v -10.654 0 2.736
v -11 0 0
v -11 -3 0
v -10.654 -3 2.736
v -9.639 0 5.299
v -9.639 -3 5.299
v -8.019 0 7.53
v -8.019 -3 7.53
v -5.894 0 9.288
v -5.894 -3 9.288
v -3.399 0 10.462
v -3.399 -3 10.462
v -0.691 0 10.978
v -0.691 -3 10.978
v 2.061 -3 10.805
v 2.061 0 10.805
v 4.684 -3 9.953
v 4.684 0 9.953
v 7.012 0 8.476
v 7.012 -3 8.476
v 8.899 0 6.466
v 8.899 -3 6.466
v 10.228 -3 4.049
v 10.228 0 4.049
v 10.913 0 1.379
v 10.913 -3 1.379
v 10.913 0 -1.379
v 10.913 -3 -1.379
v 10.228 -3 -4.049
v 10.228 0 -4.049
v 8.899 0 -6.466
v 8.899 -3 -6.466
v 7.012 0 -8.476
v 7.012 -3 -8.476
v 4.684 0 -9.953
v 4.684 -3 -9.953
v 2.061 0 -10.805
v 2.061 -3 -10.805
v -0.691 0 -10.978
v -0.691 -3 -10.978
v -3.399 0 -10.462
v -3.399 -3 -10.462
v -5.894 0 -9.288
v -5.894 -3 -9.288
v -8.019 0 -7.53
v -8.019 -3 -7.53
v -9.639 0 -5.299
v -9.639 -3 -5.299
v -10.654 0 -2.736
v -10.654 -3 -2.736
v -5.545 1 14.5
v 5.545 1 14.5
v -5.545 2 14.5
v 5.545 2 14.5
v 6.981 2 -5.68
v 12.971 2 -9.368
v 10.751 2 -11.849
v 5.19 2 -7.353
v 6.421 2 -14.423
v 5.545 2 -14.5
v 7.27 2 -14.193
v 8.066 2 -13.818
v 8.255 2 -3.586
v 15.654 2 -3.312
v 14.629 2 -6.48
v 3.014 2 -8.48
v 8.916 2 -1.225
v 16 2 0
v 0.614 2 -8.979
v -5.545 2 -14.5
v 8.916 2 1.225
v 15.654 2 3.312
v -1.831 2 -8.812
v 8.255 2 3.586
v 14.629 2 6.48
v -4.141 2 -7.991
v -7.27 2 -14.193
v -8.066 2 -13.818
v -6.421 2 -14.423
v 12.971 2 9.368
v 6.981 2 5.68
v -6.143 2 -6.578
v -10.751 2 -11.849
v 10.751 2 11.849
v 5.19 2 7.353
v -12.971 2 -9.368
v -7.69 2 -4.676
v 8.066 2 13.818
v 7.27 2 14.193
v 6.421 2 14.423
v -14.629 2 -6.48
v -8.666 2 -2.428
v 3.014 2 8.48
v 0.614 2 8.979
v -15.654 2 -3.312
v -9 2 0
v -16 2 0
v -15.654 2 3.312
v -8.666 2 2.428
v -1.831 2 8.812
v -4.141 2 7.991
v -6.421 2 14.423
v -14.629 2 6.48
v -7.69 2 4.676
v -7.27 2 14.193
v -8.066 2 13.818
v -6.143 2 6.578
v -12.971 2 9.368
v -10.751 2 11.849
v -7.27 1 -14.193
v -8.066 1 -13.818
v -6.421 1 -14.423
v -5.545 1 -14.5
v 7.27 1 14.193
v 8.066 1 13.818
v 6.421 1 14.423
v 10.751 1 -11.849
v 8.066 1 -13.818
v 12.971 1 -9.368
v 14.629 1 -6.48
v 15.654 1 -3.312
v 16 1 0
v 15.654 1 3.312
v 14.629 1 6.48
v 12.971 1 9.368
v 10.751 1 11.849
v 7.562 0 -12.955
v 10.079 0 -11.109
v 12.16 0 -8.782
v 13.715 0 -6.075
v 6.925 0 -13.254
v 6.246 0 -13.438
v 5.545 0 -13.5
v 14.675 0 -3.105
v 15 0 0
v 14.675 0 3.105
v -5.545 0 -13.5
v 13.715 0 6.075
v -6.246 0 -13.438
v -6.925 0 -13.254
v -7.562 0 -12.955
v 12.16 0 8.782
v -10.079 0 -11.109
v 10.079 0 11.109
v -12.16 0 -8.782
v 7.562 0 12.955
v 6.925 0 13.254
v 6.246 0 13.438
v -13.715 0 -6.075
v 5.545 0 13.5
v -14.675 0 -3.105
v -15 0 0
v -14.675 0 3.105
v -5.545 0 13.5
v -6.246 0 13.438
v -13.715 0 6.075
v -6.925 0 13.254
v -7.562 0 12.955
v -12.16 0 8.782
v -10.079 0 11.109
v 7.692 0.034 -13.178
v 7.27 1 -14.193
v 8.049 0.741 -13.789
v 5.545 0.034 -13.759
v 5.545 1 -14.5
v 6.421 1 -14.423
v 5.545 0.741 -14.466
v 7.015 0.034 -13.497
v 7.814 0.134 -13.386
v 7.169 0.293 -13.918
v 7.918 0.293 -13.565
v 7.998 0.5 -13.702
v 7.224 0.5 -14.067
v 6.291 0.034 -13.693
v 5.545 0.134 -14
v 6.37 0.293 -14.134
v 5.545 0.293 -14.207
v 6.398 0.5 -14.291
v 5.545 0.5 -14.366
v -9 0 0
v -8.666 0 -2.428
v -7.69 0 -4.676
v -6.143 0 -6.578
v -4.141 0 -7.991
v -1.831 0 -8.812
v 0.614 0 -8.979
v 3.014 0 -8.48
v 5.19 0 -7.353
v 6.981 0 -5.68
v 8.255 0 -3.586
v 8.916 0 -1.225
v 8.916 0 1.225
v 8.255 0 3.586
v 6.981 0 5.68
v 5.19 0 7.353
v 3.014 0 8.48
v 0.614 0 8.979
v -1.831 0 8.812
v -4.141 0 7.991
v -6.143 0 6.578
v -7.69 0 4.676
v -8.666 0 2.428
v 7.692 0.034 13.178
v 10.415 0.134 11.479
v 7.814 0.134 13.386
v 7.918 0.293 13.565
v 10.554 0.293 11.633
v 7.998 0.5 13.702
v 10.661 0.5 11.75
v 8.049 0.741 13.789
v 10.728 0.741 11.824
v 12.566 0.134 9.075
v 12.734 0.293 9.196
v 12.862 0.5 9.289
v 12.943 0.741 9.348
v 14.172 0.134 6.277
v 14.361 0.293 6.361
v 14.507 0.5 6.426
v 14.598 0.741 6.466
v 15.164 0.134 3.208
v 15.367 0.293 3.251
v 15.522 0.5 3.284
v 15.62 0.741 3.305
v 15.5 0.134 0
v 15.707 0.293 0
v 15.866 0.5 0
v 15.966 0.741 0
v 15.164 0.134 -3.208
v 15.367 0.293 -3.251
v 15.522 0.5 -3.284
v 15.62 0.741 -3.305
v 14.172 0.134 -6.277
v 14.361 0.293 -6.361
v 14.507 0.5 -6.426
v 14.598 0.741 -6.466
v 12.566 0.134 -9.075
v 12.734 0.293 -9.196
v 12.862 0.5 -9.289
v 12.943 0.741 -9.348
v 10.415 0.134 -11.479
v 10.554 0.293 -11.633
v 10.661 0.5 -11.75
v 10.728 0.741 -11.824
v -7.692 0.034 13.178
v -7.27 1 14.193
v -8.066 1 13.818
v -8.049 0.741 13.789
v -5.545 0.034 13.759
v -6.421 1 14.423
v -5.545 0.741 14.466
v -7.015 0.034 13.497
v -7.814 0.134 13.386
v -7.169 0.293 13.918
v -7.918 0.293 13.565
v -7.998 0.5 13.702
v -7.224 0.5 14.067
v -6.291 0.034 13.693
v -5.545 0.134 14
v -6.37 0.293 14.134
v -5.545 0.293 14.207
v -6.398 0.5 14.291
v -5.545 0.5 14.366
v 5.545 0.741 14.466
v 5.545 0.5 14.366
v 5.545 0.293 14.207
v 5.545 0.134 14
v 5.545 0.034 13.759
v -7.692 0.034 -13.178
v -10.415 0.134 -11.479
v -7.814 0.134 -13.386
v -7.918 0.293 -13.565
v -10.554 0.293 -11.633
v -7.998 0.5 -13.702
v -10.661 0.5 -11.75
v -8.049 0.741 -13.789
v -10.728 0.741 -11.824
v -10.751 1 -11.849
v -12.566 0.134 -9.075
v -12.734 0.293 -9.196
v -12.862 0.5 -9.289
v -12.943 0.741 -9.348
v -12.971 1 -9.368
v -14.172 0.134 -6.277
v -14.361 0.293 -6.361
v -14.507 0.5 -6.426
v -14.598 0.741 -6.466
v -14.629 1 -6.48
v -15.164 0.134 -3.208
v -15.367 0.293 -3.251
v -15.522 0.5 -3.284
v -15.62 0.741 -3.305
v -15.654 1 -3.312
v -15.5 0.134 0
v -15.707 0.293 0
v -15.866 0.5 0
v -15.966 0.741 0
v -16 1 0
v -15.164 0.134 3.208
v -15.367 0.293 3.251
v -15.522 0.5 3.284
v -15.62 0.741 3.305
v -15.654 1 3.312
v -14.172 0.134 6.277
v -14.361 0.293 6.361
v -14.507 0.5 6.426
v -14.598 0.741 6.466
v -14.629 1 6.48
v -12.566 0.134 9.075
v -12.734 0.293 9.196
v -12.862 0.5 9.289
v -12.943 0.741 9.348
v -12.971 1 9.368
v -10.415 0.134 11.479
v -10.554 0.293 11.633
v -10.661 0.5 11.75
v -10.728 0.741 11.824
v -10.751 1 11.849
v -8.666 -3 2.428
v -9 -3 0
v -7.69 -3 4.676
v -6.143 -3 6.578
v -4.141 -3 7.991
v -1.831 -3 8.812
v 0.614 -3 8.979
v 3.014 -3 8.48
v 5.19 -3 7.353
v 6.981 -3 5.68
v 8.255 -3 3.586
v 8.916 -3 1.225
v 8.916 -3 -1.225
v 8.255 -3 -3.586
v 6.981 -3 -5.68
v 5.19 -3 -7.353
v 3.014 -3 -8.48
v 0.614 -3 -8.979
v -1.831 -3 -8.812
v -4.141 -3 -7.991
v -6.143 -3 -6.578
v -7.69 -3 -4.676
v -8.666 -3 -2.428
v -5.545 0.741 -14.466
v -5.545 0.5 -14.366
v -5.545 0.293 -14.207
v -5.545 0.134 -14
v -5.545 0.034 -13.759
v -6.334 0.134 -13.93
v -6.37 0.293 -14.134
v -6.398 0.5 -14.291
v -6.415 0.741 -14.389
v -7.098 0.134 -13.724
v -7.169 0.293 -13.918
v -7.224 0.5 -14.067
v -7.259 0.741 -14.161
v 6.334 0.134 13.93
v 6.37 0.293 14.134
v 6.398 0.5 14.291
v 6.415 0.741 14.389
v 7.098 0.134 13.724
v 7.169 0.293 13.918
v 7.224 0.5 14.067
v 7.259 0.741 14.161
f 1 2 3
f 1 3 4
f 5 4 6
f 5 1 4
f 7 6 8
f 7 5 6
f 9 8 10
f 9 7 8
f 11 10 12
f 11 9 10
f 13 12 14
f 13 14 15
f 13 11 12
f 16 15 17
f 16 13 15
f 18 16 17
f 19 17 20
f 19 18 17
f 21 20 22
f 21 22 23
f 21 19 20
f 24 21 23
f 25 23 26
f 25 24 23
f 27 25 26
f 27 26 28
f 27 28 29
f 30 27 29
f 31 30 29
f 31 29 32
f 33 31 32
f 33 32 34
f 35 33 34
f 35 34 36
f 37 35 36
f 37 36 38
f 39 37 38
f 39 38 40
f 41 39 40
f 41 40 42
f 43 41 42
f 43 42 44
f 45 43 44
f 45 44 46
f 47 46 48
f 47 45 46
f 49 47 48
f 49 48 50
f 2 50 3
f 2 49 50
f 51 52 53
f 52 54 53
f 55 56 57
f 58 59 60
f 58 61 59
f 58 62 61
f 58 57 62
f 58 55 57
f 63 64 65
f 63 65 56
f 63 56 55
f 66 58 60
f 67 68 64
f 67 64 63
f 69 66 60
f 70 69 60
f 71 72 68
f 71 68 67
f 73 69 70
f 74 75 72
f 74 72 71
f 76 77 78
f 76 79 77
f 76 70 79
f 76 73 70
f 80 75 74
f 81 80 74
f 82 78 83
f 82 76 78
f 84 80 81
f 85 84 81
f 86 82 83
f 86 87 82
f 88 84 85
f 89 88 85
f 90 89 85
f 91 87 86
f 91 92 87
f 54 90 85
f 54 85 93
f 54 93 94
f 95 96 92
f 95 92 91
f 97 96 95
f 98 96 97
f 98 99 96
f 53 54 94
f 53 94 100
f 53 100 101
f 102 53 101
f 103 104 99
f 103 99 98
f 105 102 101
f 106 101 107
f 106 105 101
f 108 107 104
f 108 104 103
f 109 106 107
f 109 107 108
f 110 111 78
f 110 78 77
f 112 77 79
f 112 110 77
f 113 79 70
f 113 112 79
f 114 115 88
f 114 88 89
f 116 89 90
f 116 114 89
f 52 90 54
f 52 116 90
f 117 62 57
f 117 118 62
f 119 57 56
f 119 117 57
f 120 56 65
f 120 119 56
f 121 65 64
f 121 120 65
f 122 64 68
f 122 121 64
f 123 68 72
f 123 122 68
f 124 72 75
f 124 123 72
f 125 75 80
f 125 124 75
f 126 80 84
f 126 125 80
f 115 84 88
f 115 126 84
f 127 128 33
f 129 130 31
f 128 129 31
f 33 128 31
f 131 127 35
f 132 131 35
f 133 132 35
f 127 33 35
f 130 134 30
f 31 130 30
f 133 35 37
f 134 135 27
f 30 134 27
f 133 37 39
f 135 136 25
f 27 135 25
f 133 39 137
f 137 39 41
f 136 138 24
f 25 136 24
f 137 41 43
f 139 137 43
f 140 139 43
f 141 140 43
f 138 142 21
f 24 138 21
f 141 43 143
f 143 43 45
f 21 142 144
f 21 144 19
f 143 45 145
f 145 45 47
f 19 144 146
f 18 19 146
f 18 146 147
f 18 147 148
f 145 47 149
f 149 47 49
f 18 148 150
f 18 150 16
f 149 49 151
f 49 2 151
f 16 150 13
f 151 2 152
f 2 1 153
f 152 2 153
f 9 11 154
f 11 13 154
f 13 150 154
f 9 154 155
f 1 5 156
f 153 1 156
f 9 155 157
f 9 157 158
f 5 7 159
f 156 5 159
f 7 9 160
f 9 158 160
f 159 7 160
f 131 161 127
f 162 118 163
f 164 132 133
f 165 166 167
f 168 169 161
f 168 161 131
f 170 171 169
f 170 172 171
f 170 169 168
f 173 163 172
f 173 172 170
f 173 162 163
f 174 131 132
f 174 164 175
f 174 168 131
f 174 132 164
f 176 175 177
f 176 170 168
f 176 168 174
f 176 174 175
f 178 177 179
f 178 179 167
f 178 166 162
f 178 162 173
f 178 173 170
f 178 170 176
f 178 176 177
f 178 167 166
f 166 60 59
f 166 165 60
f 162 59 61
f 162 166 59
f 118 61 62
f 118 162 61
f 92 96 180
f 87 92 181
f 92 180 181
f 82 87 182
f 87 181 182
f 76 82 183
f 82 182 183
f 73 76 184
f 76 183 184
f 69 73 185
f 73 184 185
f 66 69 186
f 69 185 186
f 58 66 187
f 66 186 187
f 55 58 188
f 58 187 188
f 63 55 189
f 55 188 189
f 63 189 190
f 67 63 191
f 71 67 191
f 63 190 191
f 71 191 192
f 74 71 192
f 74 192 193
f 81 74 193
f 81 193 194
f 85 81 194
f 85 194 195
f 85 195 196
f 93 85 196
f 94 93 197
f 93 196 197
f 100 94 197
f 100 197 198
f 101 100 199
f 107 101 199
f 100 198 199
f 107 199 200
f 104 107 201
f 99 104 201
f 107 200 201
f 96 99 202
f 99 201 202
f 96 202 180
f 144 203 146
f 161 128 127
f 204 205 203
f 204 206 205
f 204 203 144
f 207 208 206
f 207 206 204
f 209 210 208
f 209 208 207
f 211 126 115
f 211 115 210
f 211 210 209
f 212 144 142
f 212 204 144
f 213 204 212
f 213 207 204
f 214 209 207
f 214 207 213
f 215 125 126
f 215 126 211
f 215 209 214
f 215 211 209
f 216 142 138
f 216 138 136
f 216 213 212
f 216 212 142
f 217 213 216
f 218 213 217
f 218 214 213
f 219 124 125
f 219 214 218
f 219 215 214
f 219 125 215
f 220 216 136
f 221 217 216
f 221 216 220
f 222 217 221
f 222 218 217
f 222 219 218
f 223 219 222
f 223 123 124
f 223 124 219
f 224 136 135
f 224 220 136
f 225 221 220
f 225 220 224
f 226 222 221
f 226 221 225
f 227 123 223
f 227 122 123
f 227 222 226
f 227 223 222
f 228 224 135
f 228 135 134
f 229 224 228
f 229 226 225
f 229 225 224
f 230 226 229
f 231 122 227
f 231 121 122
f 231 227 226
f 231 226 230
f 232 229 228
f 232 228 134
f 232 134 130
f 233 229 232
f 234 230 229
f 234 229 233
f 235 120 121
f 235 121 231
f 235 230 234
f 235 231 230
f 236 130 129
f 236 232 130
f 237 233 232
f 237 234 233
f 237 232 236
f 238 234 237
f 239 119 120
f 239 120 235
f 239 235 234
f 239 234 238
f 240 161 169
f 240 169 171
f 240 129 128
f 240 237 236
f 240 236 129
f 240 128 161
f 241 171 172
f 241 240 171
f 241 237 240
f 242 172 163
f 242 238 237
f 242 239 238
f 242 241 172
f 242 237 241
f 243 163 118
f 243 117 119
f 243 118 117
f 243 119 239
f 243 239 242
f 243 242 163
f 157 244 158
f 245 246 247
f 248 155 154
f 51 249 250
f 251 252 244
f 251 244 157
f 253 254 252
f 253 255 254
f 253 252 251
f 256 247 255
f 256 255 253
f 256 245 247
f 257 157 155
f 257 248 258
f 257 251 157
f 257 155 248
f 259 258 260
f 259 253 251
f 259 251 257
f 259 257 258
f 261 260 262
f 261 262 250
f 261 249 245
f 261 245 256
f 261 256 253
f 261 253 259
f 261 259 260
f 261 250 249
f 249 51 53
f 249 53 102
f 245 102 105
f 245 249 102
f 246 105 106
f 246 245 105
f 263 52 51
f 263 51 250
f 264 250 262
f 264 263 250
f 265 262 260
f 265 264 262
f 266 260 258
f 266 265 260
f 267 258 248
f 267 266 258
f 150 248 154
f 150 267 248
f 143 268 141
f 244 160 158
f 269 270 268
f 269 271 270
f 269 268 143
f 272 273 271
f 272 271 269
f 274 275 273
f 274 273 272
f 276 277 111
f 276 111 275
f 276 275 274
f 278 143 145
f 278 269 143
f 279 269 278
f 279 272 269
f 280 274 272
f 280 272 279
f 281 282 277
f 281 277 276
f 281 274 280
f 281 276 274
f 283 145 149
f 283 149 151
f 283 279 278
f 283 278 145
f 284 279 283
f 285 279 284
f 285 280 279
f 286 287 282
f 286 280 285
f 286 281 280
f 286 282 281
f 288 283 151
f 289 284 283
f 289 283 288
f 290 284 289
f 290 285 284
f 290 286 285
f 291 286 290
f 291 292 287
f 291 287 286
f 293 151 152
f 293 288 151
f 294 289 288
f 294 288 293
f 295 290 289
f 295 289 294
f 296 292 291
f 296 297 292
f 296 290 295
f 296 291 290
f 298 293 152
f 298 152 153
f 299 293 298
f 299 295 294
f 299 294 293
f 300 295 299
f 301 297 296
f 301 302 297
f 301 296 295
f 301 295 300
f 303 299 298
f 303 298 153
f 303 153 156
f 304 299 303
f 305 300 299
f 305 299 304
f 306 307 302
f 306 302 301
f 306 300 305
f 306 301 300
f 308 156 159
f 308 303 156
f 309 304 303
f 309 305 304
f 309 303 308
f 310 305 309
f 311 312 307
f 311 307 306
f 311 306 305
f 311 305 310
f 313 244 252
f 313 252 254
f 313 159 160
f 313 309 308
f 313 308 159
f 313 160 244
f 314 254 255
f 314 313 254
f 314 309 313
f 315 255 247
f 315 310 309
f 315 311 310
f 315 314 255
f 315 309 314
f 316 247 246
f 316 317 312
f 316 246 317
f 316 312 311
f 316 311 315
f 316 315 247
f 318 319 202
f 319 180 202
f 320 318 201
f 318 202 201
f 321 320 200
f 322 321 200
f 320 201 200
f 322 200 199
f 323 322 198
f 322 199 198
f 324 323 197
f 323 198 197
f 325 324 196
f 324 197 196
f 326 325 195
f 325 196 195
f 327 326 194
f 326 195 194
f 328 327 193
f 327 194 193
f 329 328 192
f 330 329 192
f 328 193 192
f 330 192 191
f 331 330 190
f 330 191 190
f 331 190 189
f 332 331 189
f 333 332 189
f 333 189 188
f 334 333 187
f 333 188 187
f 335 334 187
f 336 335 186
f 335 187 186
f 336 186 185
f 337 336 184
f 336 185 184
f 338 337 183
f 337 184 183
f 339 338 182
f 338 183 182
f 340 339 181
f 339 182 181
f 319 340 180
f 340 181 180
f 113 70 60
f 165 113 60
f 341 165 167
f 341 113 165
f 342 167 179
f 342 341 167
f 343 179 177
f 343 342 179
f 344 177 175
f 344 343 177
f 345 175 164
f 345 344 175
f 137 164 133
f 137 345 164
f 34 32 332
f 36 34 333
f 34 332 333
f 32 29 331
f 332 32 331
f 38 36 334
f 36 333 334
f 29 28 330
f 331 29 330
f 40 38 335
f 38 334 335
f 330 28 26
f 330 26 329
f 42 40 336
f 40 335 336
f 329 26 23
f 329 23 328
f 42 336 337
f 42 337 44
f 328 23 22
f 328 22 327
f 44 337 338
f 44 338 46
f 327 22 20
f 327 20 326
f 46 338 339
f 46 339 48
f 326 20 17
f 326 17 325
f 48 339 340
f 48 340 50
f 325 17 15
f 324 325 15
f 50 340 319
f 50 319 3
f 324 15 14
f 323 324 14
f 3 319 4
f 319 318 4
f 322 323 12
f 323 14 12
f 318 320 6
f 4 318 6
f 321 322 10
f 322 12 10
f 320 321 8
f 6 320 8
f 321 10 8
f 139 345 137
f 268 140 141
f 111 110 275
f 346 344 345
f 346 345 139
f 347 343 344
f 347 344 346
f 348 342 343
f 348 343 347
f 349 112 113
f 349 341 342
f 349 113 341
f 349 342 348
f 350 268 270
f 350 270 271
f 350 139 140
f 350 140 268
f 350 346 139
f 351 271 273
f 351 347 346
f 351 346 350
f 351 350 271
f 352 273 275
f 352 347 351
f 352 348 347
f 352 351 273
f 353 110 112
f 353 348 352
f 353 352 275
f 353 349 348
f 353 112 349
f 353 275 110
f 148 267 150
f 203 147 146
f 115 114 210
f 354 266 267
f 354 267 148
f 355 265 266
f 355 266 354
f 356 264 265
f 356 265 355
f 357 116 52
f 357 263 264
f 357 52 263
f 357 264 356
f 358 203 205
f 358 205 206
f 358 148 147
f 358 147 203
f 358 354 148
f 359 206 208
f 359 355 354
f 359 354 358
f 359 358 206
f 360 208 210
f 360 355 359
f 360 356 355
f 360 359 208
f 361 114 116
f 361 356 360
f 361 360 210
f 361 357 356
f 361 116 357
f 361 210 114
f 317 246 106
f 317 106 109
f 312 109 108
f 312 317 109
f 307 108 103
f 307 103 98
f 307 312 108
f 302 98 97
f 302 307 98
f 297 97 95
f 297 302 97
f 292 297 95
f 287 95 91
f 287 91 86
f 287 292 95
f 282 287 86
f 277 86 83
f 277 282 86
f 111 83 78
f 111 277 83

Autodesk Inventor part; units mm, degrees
ref_plane "YZ Plane" through (0, 0, 0) normal (1, 0, 0) x (0, 1, 0)
ref_plane "XZ Plane" through (0, 0, 0) normal (0, 1, 0) x (-1, 0, 0)
ref_plane "XY Plane" through (0, 0, 0) normal (0, 0, 1) x (1, 0, 0)
sketch "Sketch1" plane through (0, 0, 0) normal (0, 1, 0) x (-1, 0, 0)
  circle A0 centre (0, 0) radius 10 construction
  circle A1 centre (0, 0) radius 16
  circle A2 centre (0, 0) radius 11
  circle A3 centre (0, 0) radius 9
  dimension "d0" = 20
  dimension "d1" = 6
  dimension "d4" = 1
  dimension "d9" = 2
extrude "Extrusion1" add sketch "Sketch1" along normal blind 2 contours A1 | A2 | A3
extrude "Extrusion2" add sketch "Sketch1" against normal blind 3 contours A2 | A3
extrude "Extrusion4" cut sketch "Sketch1" along normal through all both and the other way through all contours A3
sketch "Sketch4" plane through (0, 2, 0) normal (0, 1, 0) x (1, 0, 0)
  circle A0 centre (0, 0) radius 16 projected
  line L0 (16, -14.5) -> (-16, -14.5)
  line L1 (-16, -14.5) -> (-16, 14.5)
  line L2 (-16, 14.5) -> (16, 14.5)
  line L3 (16, 14.5) -> (16, -14.5)
  line L4 (16, -14.5) -> (-16, 14.5) construction
  line L5 (-16, -14.5) -> (16, 14.5) construction
  line L6 (-17.5, -16) -> (17.5, -16)
  line L7 (17.5, -16) -> (17.5, 16)
  line L8 (17.5, 16) -> (-17.5, 16)
  line L9 (-17.5, 16) -> (-17.5, -16)
  dimension "d18" = 29
extrude "Extrusion6" cut sketch "Sketch4" against normal up to surface (2 mm away) contours L3 L2 A0 L8 L7 L6 L0 | L2 A0 | A0 L0 | A0 L2 L1 L0 L6 L9 L8
fillet "Fillet1" radius 5 4 edges at (-6.7639, 1, 14.5) (6.7639, 1, 14.5) (-6.7639, 1, -14.5) (6.7639, 1, -14.5)
fillet "Fillet2" radius 1 8 edges at (-6.8509, 0, 14.3265) (6.8509, 0, 14.3265) (0, 0, 14.5) (-16, 0, 0) (16, 0, 0) (-6.8509, 0, -14.3265) (6.8509, 0, -14.3265) (0, 0, -14.5)
equation "\"d0\" = FilterDia"
equation "\"MaskHeight\" = 125"
equation "\"FilterDia\" = 20"
equation "\"NoseWidth\" = 25"
equation "\"MaterialThickness\" = 2"
equation "\"Tol\" = 0.25"
equation "\"MaterialHardness\" = 0.3"
equation "\"ClipHeight\" = 4"
equation "\"ClipWidth\" = 5"
equation "\"ClipNeck\" = 5"
equation "\"ValveNeckDia\" = 3"
equation "\"ValveNeckLength\" = 2"
equation "\"ValveFlapDia\" = 19.25"
equation "\"LeftValve\" = 0"
equation "\"RightValve\" = 0"
equation "\"CoreScrewHeadDia\" = 9.525"
equation "\"CoreScrewLength\" = 50.8"
equation "\"CoreScrewID\" = 2.38125"
equation "\"CoreScrewOD\" = 3.96875"
equation "\"StrapAttachmentNeckDia\" = 6.5"
equation "\"StrapAttachmentNeckHeight\" = 1.5"
equation "\"StrapNoseRadialDifference\" = 2"
equation "\"StrapNoseHeight\" = 7.5"
equation "\"ZipTieThickness\" = 4"
equation "\"PinTol\" = 0.75"
equation "\"PinDia\" = 7"
equation "\"PinDepth\" = 5"
properties part number "FilterPort_Printable"
